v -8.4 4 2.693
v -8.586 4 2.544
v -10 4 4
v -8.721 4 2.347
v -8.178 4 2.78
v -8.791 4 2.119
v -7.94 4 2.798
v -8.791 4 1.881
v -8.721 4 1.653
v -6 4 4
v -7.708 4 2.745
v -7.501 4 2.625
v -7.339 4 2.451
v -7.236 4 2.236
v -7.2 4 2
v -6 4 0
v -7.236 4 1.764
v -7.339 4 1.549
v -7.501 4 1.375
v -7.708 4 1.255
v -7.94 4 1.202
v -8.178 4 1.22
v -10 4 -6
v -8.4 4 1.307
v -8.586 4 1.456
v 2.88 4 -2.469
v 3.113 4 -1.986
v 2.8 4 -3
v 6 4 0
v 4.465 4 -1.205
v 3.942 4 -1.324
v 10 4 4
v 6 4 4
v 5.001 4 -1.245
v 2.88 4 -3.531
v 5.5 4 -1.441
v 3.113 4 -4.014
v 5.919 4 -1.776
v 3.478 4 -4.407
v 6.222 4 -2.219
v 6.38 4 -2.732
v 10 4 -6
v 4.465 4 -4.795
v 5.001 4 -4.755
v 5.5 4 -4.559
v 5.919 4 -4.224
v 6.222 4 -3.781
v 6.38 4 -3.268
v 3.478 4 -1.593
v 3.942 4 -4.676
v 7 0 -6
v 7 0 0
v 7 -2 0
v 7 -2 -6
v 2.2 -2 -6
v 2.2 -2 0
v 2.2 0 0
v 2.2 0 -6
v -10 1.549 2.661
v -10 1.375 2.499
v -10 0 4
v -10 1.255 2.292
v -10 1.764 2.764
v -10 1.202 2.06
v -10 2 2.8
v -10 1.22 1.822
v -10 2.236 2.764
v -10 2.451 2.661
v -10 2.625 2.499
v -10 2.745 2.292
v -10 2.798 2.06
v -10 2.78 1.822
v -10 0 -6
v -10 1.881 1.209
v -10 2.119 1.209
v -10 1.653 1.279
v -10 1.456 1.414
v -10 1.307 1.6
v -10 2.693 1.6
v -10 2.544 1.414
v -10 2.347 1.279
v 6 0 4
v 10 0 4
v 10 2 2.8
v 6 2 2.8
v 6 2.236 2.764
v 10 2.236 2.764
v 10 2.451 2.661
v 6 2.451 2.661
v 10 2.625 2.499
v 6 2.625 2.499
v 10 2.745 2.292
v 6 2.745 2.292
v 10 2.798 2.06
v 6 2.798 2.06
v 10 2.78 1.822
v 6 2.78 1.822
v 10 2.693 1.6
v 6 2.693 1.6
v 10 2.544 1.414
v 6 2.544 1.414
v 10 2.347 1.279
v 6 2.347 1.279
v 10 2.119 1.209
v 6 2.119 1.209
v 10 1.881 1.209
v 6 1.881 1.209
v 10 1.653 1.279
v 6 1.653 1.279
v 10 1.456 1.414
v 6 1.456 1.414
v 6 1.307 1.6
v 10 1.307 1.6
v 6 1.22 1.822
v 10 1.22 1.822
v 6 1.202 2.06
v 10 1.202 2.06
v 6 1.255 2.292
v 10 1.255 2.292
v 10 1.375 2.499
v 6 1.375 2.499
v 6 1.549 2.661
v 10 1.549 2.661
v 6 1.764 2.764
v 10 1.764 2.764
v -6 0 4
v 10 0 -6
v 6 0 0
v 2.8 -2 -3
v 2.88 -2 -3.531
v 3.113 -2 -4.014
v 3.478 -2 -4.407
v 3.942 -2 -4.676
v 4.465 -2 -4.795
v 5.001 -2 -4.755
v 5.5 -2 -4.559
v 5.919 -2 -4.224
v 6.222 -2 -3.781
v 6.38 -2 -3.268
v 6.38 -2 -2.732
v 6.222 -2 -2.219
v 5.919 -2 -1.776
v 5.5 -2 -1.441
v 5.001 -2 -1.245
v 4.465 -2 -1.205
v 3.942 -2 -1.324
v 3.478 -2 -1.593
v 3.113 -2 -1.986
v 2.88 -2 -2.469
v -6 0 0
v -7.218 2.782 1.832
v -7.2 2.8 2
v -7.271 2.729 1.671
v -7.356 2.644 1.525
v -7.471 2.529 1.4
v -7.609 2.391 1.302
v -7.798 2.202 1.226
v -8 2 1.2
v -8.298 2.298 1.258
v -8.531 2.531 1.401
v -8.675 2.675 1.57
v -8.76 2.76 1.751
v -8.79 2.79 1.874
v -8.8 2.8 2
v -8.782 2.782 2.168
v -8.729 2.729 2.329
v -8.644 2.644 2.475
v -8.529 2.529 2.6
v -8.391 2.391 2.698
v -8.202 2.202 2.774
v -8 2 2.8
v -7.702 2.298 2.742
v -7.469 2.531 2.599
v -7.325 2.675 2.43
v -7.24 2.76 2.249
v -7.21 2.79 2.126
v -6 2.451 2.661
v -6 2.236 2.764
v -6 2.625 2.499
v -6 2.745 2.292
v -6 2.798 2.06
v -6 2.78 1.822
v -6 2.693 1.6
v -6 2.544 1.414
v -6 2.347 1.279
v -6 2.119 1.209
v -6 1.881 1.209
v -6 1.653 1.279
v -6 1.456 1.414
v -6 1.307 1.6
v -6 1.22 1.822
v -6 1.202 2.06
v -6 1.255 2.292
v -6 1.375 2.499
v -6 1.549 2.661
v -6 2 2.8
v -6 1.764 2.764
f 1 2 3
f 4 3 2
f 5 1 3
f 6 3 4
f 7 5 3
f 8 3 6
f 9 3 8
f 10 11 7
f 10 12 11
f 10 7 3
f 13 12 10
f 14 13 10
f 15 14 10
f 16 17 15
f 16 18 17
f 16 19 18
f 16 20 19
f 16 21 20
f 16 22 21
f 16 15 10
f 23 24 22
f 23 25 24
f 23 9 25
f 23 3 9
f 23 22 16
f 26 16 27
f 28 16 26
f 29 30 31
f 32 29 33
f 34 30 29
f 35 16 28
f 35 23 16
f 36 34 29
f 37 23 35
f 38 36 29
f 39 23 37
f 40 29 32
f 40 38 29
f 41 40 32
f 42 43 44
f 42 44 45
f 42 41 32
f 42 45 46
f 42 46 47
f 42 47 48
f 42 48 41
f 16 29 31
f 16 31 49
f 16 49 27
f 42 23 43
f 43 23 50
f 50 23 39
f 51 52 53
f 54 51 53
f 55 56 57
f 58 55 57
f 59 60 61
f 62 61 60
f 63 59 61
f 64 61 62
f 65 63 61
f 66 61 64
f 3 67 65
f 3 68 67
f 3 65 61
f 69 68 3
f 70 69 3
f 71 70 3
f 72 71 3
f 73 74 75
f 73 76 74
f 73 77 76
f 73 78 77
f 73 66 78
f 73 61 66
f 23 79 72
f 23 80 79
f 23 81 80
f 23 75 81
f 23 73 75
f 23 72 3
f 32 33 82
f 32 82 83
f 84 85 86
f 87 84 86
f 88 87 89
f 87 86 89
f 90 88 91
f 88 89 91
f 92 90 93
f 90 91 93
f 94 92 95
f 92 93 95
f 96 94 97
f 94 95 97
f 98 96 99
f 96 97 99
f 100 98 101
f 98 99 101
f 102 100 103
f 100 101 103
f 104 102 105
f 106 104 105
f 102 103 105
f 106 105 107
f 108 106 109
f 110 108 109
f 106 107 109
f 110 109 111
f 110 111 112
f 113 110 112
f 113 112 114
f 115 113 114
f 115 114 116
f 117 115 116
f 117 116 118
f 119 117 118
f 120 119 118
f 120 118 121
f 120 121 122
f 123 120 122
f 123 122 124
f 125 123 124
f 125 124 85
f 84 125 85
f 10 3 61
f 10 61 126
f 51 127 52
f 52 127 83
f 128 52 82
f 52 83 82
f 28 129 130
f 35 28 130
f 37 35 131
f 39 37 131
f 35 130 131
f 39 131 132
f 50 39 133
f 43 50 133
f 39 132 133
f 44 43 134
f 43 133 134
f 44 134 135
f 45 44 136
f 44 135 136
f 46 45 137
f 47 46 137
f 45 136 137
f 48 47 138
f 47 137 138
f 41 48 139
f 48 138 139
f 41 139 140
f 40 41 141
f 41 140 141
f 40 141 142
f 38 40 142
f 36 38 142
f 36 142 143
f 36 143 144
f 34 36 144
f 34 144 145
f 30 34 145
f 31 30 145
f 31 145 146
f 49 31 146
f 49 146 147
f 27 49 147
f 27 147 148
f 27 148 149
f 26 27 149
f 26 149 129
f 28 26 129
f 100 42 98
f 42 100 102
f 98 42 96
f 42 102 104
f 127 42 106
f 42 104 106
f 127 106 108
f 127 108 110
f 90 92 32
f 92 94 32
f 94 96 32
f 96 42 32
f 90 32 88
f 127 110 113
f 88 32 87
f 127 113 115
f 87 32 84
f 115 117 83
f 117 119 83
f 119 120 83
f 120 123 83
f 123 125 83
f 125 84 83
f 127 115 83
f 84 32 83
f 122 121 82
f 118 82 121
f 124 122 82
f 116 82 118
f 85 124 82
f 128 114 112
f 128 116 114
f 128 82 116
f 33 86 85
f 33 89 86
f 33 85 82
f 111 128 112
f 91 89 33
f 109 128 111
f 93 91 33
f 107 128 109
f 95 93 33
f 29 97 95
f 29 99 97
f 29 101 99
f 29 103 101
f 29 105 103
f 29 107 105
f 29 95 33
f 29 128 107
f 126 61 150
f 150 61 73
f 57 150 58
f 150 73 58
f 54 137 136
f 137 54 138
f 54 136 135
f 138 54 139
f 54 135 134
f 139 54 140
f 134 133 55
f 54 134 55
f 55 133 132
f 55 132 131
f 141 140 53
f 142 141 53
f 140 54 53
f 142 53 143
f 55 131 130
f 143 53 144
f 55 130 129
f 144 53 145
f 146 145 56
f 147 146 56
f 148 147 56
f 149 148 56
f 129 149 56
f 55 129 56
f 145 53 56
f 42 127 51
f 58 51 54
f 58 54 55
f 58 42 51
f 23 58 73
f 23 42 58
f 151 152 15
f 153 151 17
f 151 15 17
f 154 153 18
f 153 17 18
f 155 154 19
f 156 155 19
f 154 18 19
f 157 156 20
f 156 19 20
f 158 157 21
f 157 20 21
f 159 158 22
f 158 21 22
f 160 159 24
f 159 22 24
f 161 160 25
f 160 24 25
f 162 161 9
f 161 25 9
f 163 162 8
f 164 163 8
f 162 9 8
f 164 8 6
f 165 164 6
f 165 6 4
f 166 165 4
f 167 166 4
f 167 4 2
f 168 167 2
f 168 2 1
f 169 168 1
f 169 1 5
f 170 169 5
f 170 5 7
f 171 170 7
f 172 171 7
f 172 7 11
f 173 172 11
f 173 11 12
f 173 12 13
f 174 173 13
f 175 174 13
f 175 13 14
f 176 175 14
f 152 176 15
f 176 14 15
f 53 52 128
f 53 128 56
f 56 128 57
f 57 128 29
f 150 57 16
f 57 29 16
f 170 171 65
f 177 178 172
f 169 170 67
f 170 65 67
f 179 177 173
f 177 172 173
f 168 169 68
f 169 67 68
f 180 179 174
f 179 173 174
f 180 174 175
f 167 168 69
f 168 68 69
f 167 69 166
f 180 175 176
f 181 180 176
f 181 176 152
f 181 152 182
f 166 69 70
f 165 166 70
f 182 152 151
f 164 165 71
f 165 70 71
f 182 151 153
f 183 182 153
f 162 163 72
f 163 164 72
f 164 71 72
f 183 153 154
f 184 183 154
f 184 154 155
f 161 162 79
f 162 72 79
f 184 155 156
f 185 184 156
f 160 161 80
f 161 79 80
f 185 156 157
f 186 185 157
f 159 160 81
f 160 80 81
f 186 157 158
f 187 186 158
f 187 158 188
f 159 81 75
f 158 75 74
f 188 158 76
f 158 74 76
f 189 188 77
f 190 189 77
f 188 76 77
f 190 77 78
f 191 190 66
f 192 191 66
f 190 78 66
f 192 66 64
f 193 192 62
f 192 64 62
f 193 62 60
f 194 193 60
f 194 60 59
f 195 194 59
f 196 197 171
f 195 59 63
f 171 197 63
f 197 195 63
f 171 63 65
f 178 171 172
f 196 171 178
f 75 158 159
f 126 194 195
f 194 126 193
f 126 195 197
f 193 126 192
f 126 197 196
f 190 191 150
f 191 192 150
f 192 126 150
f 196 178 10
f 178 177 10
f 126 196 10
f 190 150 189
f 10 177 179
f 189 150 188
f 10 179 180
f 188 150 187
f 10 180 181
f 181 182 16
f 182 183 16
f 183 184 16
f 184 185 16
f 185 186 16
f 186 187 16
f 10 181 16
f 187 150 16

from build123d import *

# Parameters (mm, degrees)
BOSS_EXTRU_1_DEPTH                           = 6
ESQUISSE2_W                                  = 4
ESQUISSE2_H                                  = 4
BOSS_EXTRU_2_DEPTH                           = 4
TROU_POUR_TARAUDAGE_POUR_TROU_TARAUD_M2_D    = 1.6
TROU_POUR_TARAUDAGE_POUR_TROU_TARAUD_2_REACH = 15.115
TROU_POUR_TARAUDAGE_POUR_TROU_TARAUD_2_B_R   = 0.8
D_GAGEMENT_M31_D                             = 3.6


with BuildPart() as part:
    # Esquisse1 → Boss.-Extru.1 (new body)
    with BuildSketch(Plane.XY):
        Polygon((-10, 4), (10, 4), (10, 0), (7, 0), (7, -2), (2.2, -2), (2.2, 0), (-10, 0), align=None)
    extrude(amount=-BOSS_EXTRU_1_DEPTH)

    # Esquisse2 → Boss.-Extru.2 (add)
    with BuildSketch(Plane.XY):
        with Locations((-8, 2)):
            Rectangle(ESQUISSE2_W, ESQUISSE2_H)
        with Locations((8, 2)):
            Rectangle(ESQUISSE2_W, ESQUISSE2_H)
    extrude(amount=BOSS_EXTRU_2_DEPTH)

    # Trou pour taraudage pour trou taraud_ M2 (through all)
    with Locations(Plane(origin=(10, 0, 0), x_dir=(0, 0, -1), z_dir=(1, 0, 0))):
        with Locations((-2, 2)):
            Hole(TROU_POUR_TARAUDAGE_POUR_TROU_TARAUD_M2_D / 2)

    # Trou pour taraudage pour trou taraud 2 b → Trou pour taraudage pour trou taraud 2 (cut, up to next)
    with BuildSketch(Plane(origin=(0, 4, 0), x_dir=(1, 0, 0), z_dir=(0, 1, 0)), mode=Mode.PRIVATE) as trou_pour_taraudage_pour_trou_taraud_2_sk1:
        with Locations((-8, -2)):
            Circle(TROU_POUR_TARAUDAGE_POUR_TROU_TARAUD_2_B_R)
    trou_pour_taraudage_pour_trou_taraud_2_tool1 = extrude(trou_pour_taraudage_pour_trou_taraud_2_sk1.sketch, amount=-TROU_POUR_TARAUDAGE_POUR_TROU_TARAUD_2_REACH, mode=Mode.PRIVATE) & part.part
    add(trou_pour_taraudage_pour_trou_taraud_2_tool1.solids().sort_by_distance((-8, 4, 2))[0], mode=Mode.SUBTRACT)

    # Dégagement M31 (through all)
    with Locations(Plane(origin=(0, 4, 0), x_dir=(1, 0, 0), z_dir=(0, 1, 0))):
        with Locations((4.6, 3)):
            Hole(D_GAGEMENT_M31_D / 2)


solid = part.part
